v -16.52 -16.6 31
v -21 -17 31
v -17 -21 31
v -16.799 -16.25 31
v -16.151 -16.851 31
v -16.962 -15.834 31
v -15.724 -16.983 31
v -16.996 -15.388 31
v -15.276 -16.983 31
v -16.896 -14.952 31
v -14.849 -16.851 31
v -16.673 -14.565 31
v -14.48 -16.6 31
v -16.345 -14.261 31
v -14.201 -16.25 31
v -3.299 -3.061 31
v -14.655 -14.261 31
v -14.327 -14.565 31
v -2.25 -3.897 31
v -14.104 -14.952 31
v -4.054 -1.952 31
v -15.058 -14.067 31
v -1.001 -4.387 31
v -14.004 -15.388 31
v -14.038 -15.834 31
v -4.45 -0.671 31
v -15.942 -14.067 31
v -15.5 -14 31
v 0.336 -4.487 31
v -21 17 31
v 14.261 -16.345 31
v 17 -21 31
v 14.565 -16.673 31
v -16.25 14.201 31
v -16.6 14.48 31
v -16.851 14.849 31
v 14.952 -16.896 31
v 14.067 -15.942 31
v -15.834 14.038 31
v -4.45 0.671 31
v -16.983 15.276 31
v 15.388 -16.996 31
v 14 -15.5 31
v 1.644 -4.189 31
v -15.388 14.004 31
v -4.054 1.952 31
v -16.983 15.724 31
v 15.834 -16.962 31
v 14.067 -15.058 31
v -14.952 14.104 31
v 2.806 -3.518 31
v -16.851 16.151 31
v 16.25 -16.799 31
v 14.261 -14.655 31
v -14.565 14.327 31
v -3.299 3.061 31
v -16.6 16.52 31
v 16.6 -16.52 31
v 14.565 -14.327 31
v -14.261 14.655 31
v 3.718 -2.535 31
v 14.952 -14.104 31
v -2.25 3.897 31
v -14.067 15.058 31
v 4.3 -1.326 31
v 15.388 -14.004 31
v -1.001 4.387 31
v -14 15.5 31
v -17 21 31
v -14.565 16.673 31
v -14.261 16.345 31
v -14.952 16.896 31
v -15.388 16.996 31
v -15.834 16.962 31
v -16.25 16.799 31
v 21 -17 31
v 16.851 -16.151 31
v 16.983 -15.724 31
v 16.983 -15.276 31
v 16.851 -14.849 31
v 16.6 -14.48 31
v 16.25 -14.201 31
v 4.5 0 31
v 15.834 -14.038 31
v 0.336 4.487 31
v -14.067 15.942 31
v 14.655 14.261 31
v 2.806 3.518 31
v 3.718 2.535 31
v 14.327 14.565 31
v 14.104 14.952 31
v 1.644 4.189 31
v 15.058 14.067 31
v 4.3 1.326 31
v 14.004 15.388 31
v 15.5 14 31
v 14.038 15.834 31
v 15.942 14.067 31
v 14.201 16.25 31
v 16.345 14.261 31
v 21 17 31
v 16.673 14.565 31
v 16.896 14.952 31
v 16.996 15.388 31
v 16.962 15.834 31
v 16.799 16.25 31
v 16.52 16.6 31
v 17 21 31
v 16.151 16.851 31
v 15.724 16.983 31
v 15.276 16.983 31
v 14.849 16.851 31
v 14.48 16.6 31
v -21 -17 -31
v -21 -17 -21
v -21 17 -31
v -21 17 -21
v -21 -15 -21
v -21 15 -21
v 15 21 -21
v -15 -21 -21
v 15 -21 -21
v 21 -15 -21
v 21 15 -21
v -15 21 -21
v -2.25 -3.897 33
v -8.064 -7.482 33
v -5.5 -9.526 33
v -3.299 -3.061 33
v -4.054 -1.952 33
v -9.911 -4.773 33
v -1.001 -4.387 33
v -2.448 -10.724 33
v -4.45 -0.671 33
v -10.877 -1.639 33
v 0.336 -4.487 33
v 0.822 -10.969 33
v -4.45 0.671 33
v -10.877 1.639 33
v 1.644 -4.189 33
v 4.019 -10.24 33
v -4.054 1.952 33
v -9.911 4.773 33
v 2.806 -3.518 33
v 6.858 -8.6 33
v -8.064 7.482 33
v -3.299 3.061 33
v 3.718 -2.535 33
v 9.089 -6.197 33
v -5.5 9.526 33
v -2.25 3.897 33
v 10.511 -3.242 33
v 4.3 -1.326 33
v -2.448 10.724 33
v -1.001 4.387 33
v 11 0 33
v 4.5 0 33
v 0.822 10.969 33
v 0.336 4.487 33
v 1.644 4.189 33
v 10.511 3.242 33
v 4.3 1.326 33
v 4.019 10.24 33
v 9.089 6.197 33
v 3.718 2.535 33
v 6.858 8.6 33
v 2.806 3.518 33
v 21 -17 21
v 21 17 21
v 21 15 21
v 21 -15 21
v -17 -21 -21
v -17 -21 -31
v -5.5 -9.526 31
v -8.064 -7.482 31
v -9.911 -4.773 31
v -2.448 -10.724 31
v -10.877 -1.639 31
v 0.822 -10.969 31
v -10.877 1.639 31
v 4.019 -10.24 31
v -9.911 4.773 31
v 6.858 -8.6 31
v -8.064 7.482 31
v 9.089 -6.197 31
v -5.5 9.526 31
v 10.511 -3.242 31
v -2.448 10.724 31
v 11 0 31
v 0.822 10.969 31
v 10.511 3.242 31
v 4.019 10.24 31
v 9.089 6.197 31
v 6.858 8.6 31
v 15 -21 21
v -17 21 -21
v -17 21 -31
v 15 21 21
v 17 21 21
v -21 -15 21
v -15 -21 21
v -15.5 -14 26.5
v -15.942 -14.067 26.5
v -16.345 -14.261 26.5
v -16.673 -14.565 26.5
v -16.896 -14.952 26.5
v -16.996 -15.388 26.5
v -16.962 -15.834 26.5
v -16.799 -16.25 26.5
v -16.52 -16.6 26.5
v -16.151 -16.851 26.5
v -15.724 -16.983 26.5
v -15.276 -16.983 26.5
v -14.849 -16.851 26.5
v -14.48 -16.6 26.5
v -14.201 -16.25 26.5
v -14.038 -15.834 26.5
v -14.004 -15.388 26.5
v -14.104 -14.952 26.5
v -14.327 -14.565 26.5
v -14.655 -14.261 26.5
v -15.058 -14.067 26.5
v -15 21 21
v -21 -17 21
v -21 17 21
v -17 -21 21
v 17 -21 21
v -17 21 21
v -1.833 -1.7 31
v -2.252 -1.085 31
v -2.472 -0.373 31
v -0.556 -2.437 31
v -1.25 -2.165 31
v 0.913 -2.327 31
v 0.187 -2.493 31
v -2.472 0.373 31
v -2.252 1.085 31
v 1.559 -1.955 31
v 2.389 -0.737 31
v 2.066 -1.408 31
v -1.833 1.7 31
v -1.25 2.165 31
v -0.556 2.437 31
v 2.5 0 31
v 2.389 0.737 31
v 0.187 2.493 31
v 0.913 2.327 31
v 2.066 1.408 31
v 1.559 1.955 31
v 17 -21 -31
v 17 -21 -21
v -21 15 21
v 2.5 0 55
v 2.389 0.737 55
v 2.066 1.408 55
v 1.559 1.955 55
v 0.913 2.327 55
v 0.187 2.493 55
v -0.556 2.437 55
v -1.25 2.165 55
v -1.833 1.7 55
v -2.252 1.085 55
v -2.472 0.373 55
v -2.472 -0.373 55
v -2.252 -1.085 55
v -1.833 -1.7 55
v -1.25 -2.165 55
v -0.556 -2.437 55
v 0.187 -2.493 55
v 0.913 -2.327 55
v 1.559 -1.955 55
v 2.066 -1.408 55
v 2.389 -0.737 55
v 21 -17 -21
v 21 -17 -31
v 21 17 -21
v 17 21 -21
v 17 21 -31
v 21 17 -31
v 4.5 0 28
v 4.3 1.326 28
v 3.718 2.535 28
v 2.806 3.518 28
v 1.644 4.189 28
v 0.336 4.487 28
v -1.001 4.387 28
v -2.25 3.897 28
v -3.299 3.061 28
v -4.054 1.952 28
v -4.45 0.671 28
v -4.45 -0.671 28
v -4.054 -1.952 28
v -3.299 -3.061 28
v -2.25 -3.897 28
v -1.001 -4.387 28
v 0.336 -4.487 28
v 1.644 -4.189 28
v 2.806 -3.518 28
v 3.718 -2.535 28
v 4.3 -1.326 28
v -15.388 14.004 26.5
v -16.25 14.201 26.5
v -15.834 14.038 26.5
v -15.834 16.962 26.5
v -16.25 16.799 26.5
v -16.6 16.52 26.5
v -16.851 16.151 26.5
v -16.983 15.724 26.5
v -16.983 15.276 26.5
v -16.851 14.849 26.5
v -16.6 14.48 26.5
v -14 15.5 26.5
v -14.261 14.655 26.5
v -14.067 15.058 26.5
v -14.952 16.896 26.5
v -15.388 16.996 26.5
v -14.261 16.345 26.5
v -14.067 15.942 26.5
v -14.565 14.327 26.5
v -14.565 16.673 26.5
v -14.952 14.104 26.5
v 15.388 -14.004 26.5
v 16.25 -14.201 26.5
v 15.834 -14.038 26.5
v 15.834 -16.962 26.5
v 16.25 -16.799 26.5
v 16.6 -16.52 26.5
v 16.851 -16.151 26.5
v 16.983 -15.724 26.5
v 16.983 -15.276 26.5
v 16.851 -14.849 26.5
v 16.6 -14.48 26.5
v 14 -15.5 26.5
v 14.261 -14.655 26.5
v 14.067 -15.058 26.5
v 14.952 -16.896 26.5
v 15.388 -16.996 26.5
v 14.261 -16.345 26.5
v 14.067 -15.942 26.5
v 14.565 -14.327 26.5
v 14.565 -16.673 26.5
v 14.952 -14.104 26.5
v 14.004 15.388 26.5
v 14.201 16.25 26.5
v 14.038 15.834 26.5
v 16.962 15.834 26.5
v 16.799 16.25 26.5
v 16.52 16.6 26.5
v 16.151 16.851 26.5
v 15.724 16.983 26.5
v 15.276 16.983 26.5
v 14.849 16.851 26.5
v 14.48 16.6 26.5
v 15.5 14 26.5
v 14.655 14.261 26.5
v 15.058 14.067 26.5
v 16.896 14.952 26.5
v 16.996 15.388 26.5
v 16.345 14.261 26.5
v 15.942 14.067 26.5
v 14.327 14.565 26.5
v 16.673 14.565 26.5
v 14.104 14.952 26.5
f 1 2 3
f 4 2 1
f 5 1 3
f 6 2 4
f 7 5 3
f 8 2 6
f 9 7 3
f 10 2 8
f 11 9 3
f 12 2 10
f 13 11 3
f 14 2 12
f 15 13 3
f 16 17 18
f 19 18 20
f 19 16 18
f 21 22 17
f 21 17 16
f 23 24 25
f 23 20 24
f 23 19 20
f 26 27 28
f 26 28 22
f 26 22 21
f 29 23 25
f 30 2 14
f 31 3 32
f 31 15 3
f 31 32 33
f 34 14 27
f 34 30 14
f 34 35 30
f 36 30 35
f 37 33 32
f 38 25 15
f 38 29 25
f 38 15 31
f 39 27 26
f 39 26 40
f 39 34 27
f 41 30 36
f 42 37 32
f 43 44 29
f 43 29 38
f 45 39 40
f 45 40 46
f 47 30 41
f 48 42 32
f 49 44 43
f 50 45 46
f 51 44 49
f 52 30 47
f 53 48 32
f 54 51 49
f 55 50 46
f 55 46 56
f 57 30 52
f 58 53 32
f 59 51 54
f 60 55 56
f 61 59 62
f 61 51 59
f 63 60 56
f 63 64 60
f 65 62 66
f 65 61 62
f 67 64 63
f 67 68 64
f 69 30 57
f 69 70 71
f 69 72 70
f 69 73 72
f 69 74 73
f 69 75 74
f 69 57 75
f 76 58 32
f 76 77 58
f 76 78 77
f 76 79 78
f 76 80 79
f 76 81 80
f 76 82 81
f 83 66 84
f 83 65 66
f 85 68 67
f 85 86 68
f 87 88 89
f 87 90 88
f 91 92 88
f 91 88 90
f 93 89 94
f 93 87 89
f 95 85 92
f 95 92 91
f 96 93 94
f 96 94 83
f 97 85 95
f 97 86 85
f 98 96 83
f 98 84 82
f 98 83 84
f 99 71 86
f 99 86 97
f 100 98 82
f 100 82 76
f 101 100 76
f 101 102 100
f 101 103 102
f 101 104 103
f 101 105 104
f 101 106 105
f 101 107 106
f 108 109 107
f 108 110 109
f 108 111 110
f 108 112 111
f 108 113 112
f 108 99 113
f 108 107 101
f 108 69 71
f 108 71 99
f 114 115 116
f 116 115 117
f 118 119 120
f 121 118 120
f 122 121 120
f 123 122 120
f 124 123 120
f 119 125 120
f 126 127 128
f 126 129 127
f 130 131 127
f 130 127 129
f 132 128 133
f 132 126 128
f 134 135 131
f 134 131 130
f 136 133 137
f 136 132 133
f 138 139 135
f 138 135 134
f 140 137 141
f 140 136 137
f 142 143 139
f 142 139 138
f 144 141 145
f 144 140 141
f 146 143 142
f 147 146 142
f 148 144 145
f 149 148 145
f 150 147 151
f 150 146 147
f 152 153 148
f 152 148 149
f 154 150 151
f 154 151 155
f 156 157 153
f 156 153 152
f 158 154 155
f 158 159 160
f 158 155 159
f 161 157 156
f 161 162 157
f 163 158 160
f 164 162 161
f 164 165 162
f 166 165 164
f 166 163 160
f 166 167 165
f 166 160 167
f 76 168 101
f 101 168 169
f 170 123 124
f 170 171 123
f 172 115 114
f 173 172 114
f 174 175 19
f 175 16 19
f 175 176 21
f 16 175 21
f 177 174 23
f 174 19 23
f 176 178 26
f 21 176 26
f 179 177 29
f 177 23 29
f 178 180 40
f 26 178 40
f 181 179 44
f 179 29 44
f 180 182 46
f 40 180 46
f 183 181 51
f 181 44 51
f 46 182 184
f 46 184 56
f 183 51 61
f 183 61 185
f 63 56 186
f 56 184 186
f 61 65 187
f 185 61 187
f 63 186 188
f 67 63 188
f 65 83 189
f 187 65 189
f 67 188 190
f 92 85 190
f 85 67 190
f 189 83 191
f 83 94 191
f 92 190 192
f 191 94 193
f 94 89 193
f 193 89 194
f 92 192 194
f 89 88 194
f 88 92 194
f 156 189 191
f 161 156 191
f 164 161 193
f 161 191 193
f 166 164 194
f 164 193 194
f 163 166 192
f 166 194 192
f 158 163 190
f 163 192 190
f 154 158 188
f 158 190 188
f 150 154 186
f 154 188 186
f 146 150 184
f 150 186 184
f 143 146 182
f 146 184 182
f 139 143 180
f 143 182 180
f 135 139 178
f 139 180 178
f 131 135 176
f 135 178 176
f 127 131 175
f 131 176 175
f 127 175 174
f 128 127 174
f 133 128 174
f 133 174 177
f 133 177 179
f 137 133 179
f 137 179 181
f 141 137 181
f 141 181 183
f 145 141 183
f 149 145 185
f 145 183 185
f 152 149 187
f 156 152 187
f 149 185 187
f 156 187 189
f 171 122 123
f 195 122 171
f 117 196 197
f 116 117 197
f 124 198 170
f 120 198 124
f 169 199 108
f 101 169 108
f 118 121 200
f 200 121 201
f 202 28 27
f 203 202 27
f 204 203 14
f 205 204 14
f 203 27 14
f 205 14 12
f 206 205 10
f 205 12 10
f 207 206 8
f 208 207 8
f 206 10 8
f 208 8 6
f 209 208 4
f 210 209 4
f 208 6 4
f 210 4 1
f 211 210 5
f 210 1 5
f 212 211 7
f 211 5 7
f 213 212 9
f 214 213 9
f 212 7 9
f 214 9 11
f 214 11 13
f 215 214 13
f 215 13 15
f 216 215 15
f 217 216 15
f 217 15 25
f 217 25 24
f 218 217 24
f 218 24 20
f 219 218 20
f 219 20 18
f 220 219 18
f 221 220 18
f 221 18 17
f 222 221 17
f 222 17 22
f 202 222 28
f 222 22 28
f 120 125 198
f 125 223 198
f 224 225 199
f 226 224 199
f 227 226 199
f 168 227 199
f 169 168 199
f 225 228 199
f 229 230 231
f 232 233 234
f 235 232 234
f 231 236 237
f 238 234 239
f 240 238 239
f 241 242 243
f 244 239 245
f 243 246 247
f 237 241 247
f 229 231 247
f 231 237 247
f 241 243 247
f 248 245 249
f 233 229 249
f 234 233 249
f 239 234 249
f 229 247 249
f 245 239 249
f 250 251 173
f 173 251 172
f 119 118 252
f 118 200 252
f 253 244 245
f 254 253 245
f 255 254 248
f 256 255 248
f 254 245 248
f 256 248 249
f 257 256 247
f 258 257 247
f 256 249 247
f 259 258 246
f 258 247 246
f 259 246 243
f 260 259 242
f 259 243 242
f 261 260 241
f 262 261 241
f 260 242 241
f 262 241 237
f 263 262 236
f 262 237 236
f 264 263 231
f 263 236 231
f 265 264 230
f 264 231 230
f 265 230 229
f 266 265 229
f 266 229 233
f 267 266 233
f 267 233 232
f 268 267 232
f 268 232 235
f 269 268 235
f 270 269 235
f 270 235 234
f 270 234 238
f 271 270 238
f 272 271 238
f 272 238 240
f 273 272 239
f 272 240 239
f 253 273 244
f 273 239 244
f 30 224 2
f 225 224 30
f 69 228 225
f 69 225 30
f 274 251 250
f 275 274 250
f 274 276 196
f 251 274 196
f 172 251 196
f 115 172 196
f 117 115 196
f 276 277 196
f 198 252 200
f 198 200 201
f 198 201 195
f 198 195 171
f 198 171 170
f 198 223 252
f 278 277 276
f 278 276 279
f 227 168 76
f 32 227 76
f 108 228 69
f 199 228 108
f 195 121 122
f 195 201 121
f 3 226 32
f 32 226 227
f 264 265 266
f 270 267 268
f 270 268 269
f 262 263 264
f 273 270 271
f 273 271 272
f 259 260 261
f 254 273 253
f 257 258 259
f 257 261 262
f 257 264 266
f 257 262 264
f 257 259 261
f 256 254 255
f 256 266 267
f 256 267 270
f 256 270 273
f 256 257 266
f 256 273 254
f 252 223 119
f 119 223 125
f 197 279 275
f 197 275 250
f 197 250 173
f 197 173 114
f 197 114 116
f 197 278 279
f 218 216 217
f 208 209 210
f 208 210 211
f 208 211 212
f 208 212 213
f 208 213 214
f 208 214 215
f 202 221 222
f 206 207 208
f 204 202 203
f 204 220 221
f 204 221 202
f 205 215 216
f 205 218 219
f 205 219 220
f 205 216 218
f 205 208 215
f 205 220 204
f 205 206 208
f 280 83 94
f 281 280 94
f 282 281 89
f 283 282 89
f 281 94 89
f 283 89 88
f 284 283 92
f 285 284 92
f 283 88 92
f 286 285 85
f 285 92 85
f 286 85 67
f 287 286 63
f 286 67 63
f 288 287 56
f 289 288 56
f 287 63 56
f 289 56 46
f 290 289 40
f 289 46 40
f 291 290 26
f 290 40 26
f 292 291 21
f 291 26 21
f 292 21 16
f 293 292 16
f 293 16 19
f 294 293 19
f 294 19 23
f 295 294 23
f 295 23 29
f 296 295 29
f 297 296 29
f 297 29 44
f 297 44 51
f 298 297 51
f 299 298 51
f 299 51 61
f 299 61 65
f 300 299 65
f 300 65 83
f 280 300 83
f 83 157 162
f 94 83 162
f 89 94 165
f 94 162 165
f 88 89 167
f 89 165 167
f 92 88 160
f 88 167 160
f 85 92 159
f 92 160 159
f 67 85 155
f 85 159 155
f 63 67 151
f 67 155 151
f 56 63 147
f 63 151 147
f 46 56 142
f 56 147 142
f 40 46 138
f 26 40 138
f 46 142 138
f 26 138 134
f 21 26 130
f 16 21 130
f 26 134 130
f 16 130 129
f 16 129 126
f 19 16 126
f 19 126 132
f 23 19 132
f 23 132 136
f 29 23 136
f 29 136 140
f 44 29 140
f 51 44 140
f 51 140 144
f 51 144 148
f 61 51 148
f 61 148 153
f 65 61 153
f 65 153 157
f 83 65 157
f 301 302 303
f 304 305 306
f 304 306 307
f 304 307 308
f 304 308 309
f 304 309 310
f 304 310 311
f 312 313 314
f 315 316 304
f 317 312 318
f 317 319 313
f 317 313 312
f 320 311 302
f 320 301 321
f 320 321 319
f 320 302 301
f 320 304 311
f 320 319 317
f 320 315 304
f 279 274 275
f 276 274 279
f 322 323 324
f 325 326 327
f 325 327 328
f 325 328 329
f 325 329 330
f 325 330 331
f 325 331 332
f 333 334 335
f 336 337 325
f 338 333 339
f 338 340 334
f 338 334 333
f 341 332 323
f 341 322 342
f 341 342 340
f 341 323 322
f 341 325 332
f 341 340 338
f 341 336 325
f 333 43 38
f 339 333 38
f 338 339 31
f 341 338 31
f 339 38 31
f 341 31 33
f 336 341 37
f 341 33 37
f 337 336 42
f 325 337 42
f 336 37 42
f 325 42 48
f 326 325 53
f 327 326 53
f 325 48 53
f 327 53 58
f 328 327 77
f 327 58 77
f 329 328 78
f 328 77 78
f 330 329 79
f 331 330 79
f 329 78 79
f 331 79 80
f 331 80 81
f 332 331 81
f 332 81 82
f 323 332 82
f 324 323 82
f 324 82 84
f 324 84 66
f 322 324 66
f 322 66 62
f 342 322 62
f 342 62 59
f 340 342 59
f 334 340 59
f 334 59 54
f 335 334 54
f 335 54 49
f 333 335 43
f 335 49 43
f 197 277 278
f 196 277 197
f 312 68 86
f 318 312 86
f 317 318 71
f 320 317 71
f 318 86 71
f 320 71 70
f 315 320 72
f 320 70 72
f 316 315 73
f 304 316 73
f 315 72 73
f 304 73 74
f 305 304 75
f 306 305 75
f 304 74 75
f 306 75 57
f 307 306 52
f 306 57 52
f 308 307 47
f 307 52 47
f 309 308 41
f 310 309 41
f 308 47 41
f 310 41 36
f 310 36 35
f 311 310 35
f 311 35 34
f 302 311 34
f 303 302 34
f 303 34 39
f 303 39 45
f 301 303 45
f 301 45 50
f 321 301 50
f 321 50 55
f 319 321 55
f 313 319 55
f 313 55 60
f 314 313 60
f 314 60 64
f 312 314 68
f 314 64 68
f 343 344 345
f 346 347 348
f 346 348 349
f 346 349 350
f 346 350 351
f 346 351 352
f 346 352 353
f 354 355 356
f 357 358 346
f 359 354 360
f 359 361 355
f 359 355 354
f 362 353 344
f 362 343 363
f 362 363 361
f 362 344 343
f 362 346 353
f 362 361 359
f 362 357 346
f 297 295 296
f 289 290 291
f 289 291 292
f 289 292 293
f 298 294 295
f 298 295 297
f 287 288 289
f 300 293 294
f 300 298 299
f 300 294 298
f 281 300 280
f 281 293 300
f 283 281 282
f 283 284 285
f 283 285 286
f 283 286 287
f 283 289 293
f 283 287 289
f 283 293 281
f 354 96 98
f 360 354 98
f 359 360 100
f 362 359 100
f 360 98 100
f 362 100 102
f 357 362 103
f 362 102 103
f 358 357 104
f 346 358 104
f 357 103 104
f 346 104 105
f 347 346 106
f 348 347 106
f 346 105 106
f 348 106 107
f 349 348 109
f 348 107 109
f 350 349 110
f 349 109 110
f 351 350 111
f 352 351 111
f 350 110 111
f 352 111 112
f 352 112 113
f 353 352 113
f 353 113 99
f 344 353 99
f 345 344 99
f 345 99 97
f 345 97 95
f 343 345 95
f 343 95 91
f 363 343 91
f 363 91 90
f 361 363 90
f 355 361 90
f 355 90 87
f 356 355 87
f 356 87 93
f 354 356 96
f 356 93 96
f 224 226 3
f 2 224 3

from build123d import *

# Parameters (mm, degrees)
SKETCH_1_W               = 42
SKETCH_1_H               = 42
EXTRUDE_1_DEPTH          = 21
CHAMFER_1_SIZE           = 6
SKETCH_15_W              = 42
SKETCH_15_H              = 42
EXTRUDE_11_DEPTH         = 10
SKETCH_16_W              = 42
SKETCH_16_H              = 42
EXTRUDE_12_DEPTH         = 10
CHAMFER_2_SIZE           = 4
CHAMFER_3_SIZE           = 4
SKETCH_2_R               = 11
EXTRUDE_2_DEPTH          = 2
SKETCH_3_R               = 4.5
CUT_EXTRUDE_1_DEPTH      = 5
SKETCH_6_R               = 2.5
EXTRUDE_9_DEPTH          = 24
SKETCH_8_R               = 1.5
CUT_EXTRUDE_3_DEPTH      = 4.5
PATTERN_CIRCULAR_1_COUNT = 4


with BuildPart() as part:
    # 草圖1 → 填料-伸長1 (new body, symmetric)
    with BuildSketch(Plane.XY):
        Rectangle(SKETCH_1_W, SKETCH_1_H)
    extrude(amount=EXTRUDE_1_DEPTH, both=True)

    # 導角1
    chamfer_1_edges = [part.edges().sort_by_distance(p)[0] for p in [
        (21, -21, 0),
        (-21, -21, 0),
        (-21, 21, 0),
        (21, 21, 0),
    ]]
    chamfer(chamfer_1_edges, length=CHAMFER_1_SIZE)


with BuildPart() as body_2:
    # 草圖15 → 填料-伸長11 (new body)
    with BuildSketch(Plane.XY.offset(21)):
        Rectangle(SKETCH_15_W, SKETCH_15_H)
    extrude(amount=EXTRUDE_11_DEPTH)

    # 導角2
    chamfer_2_edges = [body_2.edges().sort_by_distance(p)[0] for p in [
        (21, -21, 26),
        (-21, -21, 26),
        (-21, 21, 26),
        (21, 21, 26),
    ]]
    chamfer(chamfer_2_edges, length=CHAMFER_2_SIZE)


with BuildPart() as body_3:
    # 草圖16 → 填料-伸長12 (new body)
    with BuildSketch(Plane(origin=(0, 0, -21), x_dir=(-1, 0, 0), z_dir=(0, 0, -1))):
        Rectangle(SKETCH_16_W, SKETCH_16_H)
    extrude(amount=EXTRUDE_12_DEPTH)

    # 導角3
    chamfer_3_edges = [body_3.edges().sort_by_distance(p)[0] for p in [
        (-21, -21, -26),
        (21, -21, -26),
        (21, 21, -26),
        (-21, 21, -26),
    ]]
    chamfer(chamfer_3_edges, length=CHAMFER_3_SIZE)


with BuildPart() as body_4:
    # 草圖2 → 填料-伸長2 (new body)
    with BuildSketch(Plane.XY.offset(31)):
        Circle(SKETCH_2_R)
    extrude(amount=EXTRUDE_2_DEPTH)


with BuildPart() as cut_extrude_1_tool:
    # 草圖3 → 除料-伸長1 (new body)
    with BuildSketch(Plane.XY.offset(33)):
        Circle(SKETCH_3_R)
    extrude(amount=-CUT_EXTRUDE_1_DEPTH)


with BuildPart() as body_2_1:
    add(body_2.part)

    # 除料-伸長1: cut by cut_extrude_1_tool
    add(cut_extrude_1_tool.part, mode=Mode.SUBTRACT)

    # 草圖8 → 除料-伸長3 (cut)
    with BuildSketch(Plane.XY.offset(31)):
        with Locations((-15.5, 15.5)):
            Circle(SKETCH_8_R)
    cut_extrude_3 = extrude(amount=-CUT_EXTRUDE_3_DEPTH, mode=Mode.SUBTRACT)

    # 環狀複製排列1: 除料-伸長3 ×4 about axis
    pattern_circular_1_axis = Axis((0, 0, 0), (0, 0, 1))
    for i in range(1, PATTERN_CIRCULAR_1_COUNT):
        add(cut_extrude_3.rotate(pattern_circular_1_axis, i * 360 / PATTERN_CIRCULAR_1_COUNT), mode=Mode.SUBTRACT)


with BuildPart() as body_4_1:
    add(body_4.part)

    # 除料-伸長1: cut by cut_extrude_1_tool
    add(cut_extrude_1_tool.part, mode=Mode.SUBTRACT)


with BuildPart() as body_5:
    # 草圖6 → 填料-伸長9 (new body)
    with BuildSketch(Plane.XY.offset(31)):
        Circle(SKETCH_6_R)
    extrude(amount=EXTRUDE_9_DEPTH)


solid = Compound([part.part, body_3.part, body_2_1.part, body_4_1.part, body_5.part])
